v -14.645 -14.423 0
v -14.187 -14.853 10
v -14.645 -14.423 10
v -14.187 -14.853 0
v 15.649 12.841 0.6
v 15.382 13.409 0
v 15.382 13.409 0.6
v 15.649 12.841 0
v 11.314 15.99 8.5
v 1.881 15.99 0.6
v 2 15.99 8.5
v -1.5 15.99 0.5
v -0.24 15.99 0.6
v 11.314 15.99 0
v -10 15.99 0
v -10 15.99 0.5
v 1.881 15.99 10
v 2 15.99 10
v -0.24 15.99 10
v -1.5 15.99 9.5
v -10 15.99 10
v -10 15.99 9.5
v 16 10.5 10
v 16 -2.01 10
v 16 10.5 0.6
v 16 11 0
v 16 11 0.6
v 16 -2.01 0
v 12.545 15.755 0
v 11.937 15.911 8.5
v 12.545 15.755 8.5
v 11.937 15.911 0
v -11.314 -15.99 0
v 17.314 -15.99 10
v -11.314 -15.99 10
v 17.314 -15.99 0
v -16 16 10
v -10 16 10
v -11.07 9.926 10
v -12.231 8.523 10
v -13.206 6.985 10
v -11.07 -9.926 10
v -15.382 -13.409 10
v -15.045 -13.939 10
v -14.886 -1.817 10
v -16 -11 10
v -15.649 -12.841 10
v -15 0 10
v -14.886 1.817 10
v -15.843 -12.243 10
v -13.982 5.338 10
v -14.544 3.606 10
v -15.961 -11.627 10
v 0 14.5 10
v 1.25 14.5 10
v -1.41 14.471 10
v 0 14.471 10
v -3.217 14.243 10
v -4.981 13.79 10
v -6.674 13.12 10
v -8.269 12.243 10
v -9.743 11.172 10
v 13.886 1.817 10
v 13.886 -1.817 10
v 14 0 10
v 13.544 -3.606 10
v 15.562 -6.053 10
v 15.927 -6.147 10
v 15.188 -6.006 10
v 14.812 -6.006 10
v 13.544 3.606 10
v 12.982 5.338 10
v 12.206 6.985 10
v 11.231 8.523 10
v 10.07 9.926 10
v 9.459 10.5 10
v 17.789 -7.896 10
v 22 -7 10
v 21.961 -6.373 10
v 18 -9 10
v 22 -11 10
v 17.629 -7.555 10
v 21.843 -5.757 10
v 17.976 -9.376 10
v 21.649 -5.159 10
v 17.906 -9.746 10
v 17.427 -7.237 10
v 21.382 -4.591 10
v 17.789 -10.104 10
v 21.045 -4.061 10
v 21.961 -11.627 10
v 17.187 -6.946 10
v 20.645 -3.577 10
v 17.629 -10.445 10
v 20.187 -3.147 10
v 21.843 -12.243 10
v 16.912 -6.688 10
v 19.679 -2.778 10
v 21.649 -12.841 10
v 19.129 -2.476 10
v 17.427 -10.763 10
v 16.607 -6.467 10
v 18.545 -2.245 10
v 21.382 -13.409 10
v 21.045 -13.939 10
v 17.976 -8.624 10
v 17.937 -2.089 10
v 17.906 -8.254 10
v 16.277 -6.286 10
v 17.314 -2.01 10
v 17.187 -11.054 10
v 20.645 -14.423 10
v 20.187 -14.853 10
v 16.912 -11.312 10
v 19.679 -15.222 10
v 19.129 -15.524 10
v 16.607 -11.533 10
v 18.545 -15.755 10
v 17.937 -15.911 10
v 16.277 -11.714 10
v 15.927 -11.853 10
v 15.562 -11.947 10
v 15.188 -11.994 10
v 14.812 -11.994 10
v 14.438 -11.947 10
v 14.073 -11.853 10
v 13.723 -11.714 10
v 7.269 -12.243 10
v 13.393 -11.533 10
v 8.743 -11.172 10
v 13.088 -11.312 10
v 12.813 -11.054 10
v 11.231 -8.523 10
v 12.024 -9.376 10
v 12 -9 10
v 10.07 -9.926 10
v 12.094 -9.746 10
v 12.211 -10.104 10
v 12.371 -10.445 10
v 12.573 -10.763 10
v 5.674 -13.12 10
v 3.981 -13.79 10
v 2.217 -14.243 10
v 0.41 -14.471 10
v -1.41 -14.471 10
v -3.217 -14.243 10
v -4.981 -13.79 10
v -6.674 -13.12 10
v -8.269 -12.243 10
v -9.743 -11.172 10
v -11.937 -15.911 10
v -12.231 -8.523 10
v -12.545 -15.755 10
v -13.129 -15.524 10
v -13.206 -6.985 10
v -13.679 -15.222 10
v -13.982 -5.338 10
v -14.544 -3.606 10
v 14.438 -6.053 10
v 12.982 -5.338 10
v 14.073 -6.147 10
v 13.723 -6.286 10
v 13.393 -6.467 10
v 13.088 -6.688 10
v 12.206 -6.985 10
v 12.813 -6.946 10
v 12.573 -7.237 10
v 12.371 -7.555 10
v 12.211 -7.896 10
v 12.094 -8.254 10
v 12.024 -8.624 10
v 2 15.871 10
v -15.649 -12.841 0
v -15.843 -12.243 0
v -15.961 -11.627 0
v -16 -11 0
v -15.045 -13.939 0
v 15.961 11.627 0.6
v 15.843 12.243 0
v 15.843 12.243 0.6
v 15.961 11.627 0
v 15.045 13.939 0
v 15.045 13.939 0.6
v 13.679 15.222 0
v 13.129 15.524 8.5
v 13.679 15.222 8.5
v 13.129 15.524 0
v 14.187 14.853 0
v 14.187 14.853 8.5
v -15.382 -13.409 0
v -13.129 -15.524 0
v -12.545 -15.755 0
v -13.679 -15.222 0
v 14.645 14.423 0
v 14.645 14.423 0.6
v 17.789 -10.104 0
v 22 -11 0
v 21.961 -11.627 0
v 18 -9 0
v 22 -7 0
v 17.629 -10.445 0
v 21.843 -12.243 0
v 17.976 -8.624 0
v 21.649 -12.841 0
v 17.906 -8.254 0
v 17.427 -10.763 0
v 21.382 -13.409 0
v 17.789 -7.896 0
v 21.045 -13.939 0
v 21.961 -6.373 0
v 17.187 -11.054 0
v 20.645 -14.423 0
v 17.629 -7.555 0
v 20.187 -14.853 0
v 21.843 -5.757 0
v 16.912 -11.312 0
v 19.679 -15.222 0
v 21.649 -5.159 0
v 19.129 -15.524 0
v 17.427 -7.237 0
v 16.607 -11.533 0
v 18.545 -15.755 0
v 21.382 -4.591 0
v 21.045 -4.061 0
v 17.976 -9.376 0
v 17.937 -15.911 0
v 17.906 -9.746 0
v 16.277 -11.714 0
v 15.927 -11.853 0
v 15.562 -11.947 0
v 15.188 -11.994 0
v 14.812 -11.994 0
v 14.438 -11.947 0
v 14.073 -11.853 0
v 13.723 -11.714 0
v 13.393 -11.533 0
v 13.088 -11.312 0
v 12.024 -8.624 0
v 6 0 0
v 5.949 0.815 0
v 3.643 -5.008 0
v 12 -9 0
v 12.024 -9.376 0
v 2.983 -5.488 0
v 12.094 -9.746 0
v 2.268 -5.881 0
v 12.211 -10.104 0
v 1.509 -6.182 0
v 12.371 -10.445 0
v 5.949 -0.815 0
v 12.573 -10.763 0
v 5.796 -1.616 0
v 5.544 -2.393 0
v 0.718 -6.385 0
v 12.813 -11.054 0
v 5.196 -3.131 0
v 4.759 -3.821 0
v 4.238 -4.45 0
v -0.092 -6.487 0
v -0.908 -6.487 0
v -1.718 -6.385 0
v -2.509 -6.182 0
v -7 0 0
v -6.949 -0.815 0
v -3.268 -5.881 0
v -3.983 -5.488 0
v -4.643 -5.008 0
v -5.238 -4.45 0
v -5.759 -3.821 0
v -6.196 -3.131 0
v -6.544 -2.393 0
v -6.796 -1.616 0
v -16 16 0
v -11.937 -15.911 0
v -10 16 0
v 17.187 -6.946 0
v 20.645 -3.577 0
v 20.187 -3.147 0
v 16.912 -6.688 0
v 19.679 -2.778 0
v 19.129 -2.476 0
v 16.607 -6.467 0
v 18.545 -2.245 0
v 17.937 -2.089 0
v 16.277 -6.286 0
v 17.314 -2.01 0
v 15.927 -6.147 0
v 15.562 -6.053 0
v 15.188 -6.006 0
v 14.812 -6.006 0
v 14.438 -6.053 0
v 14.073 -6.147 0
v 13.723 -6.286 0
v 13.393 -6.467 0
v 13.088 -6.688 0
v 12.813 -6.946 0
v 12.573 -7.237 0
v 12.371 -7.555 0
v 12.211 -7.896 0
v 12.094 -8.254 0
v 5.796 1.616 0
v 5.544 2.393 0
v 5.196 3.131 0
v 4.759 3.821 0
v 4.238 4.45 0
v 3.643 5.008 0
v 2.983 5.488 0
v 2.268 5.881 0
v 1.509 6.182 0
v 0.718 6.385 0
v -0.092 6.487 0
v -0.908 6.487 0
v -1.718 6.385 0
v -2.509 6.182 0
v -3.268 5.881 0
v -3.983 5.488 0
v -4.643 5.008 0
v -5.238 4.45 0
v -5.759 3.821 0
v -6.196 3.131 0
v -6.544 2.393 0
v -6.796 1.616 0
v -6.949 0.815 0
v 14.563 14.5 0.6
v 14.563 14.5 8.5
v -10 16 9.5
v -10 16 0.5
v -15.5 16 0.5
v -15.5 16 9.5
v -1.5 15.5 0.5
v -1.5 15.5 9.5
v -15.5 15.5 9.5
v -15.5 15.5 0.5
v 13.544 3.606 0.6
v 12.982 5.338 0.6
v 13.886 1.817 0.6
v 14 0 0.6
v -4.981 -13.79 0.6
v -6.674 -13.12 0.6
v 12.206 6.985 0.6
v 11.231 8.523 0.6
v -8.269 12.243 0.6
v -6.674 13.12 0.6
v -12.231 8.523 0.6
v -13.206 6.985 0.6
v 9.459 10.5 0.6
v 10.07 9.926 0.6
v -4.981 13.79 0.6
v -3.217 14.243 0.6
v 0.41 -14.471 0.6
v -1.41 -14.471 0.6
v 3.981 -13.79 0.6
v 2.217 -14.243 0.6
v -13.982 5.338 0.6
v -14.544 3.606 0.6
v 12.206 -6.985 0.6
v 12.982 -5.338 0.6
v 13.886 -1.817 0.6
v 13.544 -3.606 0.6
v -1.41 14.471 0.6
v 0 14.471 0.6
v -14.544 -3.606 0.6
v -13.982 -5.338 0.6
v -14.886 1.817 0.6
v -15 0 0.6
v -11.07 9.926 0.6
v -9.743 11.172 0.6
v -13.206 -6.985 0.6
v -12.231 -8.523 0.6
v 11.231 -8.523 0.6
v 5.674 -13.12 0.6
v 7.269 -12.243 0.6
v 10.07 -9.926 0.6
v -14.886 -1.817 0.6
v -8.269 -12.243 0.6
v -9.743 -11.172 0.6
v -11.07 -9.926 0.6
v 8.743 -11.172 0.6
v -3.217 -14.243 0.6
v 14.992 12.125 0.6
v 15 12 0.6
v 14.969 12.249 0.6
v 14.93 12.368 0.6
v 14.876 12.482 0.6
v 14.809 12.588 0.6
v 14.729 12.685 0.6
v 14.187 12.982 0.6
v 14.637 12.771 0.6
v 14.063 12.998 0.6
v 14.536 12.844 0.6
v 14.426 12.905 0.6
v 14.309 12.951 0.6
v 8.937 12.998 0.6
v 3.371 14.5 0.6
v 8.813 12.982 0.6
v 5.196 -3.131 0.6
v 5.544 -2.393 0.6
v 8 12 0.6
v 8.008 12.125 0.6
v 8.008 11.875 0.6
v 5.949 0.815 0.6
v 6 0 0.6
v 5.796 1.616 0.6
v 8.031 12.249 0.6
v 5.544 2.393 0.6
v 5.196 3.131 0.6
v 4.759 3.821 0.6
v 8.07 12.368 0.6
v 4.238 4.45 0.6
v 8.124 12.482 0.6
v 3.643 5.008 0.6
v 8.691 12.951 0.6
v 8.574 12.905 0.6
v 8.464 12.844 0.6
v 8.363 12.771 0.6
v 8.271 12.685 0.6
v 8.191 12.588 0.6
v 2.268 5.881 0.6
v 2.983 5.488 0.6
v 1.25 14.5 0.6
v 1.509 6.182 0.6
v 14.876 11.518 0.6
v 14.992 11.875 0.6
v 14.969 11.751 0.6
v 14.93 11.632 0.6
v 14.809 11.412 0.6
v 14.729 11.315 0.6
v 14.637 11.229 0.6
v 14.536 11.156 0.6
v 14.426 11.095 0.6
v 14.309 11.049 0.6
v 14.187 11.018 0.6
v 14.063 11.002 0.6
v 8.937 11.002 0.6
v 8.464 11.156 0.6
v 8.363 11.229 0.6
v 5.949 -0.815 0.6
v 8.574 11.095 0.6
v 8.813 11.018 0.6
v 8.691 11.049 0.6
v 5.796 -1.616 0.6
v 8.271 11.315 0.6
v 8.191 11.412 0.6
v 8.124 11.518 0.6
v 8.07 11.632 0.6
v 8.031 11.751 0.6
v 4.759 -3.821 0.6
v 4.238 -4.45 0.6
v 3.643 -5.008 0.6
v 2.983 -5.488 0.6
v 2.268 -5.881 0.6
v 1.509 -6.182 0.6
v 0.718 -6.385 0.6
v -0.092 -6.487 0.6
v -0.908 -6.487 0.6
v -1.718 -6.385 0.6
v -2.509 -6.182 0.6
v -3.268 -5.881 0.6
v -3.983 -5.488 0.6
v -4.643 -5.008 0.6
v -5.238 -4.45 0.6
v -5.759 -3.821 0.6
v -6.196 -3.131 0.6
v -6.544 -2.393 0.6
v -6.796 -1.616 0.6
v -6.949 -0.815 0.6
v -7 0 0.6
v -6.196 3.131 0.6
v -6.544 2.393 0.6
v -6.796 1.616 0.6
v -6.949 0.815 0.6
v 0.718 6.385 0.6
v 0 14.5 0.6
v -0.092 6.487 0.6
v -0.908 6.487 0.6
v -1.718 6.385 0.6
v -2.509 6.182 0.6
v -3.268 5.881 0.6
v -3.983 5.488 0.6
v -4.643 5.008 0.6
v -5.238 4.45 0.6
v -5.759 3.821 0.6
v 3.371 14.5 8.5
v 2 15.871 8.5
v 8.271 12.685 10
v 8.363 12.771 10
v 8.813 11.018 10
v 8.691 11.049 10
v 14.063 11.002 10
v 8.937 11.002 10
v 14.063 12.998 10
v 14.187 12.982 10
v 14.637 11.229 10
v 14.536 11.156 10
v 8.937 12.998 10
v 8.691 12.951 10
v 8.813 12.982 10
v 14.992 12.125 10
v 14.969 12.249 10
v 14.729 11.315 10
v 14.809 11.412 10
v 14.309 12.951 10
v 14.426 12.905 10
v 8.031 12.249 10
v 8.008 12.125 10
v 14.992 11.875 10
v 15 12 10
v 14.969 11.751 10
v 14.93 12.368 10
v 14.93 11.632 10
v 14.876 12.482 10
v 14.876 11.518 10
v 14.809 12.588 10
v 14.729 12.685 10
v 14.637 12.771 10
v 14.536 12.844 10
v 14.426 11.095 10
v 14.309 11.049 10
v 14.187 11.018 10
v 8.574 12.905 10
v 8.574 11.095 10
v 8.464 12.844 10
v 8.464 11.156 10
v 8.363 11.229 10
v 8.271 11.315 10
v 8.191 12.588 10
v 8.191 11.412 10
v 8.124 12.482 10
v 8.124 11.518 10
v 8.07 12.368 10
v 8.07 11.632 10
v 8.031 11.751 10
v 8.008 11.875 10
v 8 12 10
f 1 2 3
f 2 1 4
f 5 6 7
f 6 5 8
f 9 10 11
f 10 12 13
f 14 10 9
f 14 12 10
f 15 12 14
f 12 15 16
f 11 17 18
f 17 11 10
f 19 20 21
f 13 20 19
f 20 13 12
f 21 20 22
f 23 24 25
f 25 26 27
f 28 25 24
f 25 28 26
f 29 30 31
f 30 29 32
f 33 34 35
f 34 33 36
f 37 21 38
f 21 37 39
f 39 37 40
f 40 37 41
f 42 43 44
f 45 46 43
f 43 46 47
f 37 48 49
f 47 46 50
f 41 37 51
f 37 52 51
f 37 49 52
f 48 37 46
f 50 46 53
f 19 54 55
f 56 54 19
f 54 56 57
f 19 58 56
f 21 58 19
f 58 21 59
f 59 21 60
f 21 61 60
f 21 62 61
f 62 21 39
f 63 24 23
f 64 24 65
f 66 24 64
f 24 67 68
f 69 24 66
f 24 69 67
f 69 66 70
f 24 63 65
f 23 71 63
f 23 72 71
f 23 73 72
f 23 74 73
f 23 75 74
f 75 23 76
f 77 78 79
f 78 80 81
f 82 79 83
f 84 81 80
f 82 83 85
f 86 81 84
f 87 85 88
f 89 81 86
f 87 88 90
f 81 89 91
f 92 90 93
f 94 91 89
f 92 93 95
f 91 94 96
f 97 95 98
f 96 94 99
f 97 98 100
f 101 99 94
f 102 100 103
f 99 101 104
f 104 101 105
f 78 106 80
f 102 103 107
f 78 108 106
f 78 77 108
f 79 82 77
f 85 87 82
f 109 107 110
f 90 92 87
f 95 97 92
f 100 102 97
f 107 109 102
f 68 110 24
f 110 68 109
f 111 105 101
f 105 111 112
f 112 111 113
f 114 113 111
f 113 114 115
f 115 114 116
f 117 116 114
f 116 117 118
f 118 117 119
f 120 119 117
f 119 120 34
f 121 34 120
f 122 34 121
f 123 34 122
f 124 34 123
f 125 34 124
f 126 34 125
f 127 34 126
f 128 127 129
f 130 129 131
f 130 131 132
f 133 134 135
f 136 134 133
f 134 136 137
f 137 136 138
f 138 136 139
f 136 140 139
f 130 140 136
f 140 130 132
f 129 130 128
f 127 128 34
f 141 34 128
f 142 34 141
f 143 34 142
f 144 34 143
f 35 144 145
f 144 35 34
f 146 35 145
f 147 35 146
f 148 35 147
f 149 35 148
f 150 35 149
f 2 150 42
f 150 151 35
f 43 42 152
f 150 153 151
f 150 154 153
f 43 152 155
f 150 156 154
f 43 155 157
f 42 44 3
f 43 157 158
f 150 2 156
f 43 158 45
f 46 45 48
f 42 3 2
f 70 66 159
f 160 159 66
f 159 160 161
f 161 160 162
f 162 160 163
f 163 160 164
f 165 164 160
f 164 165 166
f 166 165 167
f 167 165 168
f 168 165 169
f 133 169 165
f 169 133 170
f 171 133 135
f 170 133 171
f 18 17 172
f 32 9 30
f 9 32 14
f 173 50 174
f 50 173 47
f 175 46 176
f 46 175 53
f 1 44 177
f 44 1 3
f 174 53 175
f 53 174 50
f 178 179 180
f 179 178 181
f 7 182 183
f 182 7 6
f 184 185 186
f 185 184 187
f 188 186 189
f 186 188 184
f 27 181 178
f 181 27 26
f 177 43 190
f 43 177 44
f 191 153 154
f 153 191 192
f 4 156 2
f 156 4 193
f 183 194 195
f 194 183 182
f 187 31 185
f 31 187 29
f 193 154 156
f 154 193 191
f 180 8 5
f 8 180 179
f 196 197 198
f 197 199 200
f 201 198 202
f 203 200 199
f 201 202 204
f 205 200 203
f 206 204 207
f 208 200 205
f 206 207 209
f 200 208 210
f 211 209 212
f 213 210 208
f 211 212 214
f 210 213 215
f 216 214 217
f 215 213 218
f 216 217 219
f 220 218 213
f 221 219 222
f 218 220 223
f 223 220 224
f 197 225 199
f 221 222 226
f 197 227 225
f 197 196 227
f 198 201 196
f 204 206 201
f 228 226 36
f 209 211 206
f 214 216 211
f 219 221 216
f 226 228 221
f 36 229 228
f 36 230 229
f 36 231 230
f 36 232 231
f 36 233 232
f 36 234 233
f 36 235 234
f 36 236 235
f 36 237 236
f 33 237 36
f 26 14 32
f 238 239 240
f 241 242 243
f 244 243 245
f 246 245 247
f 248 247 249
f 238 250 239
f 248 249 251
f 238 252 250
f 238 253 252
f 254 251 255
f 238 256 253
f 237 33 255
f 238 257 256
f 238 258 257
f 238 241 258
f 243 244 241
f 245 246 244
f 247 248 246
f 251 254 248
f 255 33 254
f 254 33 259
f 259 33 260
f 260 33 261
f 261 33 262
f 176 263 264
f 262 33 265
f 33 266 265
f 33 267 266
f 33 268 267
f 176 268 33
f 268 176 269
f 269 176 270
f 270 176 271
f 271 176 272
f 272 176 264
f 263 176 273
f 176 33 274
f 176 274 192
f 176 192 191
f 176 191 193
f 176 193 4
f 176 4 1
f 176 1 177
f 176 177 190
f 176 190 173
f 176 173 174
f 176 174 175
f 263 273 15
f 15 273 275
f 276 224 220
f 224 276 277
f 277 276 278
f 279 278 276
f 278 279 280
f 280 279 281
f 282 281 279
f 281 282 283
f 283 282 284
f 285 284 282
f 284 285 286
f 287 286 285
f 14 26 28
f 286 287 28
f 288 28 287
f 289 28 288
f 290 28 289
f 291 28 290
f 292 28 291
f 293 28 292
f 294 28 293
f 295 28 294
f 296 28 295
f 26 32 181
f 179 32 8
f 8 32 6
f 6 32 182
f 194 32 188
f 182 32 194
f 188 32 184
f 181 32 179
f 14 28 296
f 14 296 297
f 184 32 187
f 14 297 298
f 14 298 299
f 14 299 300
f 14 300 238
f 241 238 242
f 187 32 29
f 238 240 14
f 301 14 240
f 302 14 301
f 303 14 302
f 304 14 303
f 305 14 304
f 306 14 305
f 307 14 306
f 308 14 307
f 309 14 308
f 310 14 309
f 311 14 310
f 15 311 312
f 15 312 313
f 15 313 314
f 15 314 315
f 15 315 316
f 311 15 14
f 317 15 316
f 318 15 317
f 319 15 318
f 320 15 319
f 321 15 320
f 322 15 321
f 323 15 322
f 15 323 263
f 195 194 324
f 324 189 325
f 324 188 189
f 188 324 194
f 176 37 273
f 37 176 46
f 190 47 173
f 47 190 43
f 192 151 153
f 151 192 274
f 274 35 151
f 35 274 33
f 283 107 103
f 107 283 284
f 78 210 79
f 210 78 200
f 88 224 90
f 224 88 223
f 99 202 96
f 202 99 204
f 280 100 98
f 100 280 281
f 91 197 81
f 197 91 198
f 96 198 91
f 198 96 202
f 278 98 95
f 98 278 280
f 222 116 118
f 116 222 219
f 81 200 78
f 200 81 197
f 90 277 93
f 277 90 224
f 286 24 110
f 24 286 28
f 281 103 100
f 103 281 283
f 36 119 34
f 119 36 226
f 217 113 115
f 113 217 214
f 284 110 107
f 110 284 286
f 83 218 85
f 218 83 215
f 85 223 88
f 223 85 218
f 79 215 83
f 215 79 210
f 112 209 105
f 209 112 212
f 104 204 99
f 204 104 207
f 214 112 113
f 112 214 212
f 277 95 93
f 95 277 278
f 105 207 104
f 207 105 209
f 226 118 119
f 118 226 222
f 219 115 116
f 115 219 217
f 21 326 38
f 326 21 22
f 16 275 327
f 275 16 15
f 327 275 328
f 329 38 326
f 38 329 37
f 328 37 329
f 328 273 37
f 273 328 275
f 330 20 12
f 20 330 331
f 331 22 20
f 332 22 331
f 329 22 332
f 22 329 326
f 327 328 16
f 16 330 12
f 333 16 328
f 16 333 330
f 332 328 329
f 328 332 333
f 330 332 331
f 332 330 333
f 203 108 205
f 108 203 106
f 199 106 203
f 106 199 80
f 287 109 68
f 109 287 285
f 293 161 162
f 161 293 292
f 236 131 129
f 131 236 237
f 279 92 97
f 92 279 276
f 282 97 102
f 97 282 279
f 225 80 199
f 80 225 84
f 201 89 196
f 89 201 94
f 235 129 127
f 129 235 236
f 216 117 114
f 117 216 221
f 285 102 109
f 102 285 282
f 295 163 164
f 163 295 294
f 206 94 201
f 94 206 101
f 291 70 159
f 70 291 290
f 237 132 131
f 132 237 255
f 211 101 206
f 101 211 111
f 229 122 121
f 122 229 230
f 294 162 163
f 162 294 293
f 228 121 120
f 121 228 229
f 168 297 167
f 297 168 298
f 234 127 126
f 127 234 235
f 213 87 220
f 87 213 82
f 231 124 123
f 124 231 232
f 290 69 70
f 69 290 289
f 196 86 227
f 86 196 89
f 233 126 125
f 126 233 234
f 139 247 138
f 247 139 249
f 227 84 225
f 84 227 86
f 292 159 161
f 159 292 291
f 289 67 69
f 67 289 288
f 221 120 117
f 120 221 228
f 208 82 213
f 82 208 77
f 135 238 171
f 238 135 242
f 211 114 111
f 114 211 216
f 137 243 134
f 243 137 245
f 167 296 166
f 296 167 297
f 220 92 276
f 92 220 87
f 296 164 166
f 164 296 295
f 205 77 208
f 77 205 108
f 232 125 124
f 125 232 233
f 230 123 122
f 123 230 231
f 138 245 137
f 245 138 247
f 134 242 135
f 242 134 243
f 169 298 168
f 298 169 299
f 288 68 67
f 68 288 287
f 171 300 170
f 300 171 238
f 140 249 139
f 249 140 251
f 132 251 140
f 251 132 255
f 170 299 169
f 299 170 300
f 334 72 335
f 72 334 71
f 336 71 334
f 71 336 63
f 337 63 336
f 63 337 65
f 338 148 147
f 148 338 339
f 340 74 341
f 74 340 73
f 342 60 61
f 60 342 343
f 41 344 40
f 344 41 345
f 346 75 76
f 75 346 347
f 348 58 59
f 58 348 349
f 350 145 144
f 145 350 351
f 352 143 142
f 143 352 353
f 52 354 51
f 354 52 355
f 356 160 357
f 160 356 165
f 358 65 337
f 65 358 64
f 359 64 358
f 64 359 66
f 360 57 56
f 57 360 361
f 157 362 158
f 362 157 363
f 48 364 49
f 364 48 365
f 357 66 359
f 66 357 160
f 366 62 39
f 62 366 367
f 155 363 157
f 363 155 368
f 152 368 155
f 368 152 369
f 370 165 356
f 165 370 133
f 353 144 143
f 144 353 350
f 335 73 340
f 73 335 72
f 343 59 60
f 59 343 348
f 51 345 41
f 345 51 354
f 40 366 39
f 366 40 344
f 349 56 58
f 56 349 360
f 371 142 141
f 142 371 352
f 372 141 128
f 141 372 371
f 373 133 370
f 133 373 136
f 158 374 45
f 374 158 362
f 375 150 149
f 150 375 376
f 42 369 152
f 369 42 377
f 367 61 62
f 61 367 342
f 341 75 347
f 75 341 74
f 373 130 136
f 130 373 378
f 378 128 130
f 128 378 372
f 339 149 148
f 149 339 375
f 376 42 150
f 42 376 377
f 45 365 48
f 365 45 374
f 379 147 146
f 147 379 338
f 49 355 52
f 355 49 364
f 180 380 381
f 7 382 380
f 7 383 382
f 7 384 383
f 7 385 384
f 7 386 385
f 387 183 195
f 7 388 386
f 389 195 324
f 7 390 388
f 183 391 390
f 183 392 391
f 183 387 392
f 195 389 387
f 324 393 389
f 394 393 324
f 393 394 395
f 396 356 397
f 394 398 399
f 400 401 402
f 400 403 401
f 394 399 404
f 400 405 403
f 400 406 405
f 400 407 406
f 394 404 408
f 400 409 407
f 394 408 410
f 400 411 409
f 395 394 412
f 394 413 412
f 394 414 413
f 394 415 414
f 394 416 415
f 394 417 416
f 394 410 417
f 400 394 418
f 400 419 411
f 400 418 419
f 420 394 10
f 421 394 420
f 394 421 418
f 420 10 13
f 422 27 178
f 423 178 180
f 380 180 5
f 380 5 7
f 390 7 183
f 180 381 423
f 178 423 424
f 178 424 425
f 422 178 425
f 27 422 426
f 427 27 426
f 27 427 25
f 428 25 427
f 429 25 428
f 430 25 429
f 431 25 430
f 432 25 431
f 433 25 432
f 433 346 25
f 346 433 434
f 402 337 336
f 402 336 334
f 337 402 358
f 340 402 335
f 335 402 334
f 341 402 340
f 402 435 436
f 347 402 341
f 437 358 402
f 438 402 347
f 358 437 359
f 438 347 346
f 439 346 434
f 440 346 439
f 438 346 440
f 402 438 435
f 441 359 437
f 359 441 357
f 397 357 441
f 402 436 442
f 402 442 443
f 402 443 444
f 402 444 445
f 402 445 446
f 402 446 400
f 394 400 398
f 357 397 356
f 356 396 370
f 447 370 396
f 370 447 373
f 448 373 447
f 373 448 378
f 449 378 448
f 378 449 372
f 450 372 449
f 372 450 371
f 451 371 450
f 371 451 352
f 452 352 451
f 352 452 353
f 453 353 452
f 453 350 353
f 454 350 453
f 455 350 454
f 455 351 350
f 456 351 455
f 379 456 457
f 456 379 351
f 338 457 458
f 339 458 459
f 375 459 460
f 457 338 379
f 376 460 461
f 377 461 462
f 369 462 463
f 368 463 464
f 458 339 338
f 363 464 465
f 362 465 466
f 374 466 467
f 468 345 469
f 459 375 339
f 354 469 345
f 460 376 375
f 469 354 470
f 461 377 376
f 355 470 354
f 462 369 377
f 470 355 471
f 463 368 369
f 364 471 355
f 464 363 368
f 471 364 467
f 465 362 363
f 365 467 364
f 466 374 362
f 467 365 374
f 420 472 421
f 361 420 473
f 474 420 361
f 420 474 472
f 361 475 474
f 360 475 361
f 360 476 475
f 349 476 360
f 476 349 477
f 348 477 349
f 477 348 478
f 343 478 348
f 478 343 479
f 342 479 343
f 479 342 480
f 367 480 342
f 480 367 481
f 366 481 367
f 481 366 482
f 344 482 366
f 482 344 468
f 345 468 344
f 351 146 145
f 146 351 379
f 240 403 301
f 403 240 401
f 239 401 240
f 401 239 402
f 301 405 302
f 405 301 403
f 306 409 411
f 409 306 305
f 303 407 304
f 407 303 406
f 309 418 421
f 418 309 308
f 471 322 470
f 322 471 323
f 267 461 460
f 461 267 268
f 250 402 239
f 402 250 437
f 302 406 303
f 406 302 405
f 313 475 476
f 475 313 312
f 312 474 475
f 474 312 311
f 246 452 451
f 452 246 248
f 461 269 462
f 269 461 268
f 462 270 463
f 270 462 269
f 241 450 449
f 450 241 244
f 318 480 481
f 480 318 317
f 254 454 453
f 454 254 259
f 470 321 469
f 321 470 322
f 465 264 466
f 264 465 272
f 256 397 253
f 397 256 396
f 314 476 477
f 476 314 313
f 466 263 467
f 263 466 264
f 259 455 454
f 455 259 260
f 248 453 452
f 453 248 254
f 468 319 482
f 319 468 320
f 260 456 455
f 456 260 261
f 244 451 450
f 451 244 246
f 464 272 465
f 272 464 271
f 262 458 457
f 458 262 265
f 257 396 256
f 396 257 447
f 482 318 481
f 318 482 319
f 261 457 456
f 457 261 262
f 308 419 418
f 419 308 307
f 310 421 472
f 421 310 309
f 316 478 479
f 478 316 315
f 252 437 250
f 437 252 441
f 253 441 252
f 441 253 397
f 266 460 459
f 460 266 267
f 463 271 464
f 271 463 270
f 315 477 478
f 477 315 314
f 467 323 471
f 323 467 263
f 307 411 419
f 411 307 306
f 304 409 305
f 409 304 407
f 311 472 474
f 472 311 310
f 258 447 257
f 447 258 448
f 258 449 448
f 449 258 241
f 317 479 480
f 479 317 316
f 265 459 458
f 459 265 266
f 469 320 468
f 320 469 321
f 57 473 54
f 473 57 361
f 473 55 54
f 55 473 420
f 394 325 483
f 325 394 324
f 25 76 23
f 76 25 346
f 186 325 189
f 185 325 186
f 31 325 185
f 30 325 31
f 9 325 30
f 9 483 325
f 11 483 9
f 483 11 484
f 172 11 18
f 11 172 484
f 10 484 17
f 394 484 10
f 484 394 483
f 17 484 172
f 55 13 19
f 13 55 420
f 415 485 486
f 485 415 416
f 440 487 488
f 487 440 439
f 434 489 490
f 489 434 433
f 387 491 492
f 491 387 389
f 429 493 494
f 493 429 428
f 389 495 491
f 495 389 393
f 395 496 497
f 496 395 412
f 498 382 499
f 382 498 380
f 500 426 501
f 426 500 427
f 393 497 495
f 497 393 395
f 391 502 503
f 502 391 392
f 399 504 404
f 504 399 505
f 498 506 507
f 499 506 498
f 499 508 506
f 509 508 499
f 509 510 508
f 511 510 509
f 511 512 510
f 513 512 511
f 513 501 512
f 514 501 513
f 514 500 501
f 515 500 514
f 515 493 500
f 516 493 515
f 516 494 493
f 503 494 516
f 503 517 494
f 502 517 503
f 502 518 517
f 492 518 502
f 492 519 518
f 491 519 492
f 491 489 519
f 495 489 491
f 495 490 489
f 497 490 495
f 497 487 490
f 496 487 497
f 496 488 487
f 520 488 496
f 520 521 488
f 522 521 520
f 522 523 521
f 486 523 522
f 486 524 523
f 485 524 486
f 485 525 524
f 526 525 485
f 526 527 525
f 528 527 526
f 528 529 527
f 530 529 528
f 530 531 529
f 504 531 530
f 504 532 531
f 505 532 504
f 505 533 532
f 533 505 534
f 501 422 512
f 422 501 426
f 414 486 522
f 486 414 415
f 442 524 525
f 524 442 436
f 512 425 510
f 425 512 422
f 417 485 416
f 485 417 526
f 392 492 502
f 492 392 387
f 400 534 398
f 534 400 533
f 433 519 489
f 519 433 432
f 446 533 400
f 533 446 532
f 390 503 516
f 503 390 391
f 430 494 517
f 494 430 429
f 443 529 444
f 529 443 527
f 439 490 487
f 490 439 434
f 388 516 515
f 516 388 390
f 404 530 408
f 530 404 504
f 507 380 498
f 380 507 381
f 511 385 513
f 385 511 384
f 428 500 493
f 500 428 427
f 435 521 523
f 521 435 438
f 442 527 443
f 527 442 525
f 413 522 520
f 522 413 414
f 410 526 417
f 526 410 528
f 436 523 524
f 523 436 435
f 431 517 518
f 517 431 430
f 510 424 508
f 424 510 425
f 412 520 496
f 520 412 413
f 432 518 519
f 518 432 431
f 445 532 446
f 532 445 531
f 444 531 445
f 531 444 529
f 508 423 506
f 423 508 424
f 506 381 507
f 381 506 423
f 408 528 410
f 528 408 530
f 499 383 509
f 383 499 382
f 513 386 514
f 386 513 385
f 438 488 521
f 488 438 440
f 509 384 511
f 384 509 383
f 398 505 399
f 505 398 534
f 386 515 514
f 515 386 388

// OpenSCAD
$fn = 50;


union() {
	difference() {
		union() {
			translate(v = [0, 0, 0]) {
				rotate(a = [0, 0, 0]) {
					hull() {
						translate(v = [-11.0000000000, 11.0000000000, 0]) {
							rotate(a = [0, 0, 0]) {
								translate(v = [0, 0, 0]) {
									rotate(a = [0, 0, 0]) {
										cylinder(h = 10, r = 5);
									}
								}
							}
						}
						translate(v = [11.0000000000, 11.0000000000, 0]) {
							rotate(a = [0, 0, 0]) {
								translate(v = [0, 0, 0]) {
									rotate(a = [0, 0, 0]) {
										cylinder(h = 10, r = 5);
									}
								}
							}
						}
						translate(v = [-11.0000000000, -11.0000000000, 0]) {
							rotate(a = [0, 0, 0]) {
								translate(v = [0, 0, 0]) {
									rotate(a = [0, 0, 0]) {
										cylinder(h = 10, r = 5);
									}
								}
							}
						}
						translate(v = [11.0000000000, -11.0000000000, 0]) {
							rotate(a = [0, 0, 0]) {
								translate(v = [0, 0, 0]) {
									rotate(a = [0, 0, 0]) {
										cylinder(h = 10, r = 5);
									}
								}
							}
						}
					}
				}
			}
			translate(v = [7.5000000000, -9.0000000000, 0]) {
				rotate(a = [0, 0, 0]) {
					hull() {
						translate(v = [-9.5000000000, 2.0000000000, 0]) {
							rotate(a = [0, 0, 0]) {
								translate(v = [0, 0, 0]) {
									rotate(a = [0, 0, 0]) {
										cylinder(h = 10, r = 5);
									}
								}
							}
						}
						translate(v = [9.5000000000, 2.0000000000, 0]) {
							rotate(a = [0, 0, 0]) {
								translate(v = [0, 0, 0]) {
									rotate(a = [0, 0, 0]) {
										cylinder(h = 10, r = 5);
									}
								}
							}
						}
						translate(v = [-9.5000000000, -2.0000000000, 0]) {
							rotate(a = [0, 0, 0]) {
								translate(v = [0, 0, 0]) {
									rotate(a = [0, 0, 0]) {
										cylinder(h = 10, r = 5);
									}
								}
							}
						}
						translate(v = [9.5000000000, -2.0000000000, 0]) {
							rotate(a = [0, 0, 0]) {
								translate(v = [0, 0, 0]) {
									rotate(a = [0, 0, 0]) {
										cylinder(h = 10, r = 5);
									}
								}
							}
						}
					}
				}
			}
			translate(v = [-16.0000000000, 10.0000000000, 0]) {
				rotate(a = [0, 0, 0]) {
					cube(size = [6, 6, 10]);
				}
			}
		}
		union() {
			translate(v = [-15.5000000000, 15.5000000000, 0.5000000000]) {
				rotate(a = [0, 0, 0]) {
					cube(size = [14, 0.5000000000, 9.0000000000]);
				}
			}
			translate(v = [15.0000000000, -9.0000000000, -125.0000000000]) {
				rotate(a = [0, 0, 0]) {
					cylinder(h = 250, r = 3.0000000000);
				}
			}
			translate(v = [-0.5000000000, 0.0000000000, 0.6000000000]) {
				rotate(a = [0, 0, 0]) {
					cylinder(h = 12.4000000000, r = 14.5000000000);
				}
			}
			translate(v = [-0.5000000000, 0.0000000000, -5.0000000000]) {
				rotate(a = [0, 0, 0]) {
					cylinder(h = 10, r = 6.5000000000);
				}
			}
			translate(v = [0.0000000000, 10.5000000000, 0.6000000000]) {
				rotate(a = [0, 0, 0]) {
					cube(size = [16.0000000000, 4, 12.4000000000]);
				}
			}
			translate(v = [2.0000000000, 10.5000000000, 8.5000000000]) {
				rotate(a = [0, 0, 0]) {
					cube(size = [14.0000000000, 7, 1.5000000000]);
				}
			}
			translate(v = [-3.0000000000, 18.7500000000, 0.6000000000]) {
				rotate(a = [0, 0, -45]) {
					cube(size = [10, 1.5000000000, 12.4000000000]);
				}
			}
			translate(v = [2.2500000000, 11.0000000000, 0.6000000000]) {
				rotate(a = [0, 0, 0]) {
					cube(size = [7.5000000000, 2, 9.4000000000]);
				}
			}
		}
	}
	union() {
		translate(v = [11.5000000000, 12, 0]) {
			rotate(a = [0, 0, 0]) {
				hull() {
					translate(v = [2.5000000000, 0, 0]) {
						rotate(a = [0, 0, 0]) {
							translate(v = [0, 0, 0]) {
								rotate(a = [0, 0, 0]) {
									cylinder(h = 10, r = 1.0000000000);
								}
							}
						}
					}
					translate(v = [-2.5000000000, 0, 0]) {
						rotate(a = [0, 0, 0]) {
							translate(v = [0, 0, 0]) {
								rotate(a = [0, 0, 0]) {
									cylinder(h = 10, r = 1.0000000000);
								}
							}
						}
					}
				}
			}
		}
	}
}
